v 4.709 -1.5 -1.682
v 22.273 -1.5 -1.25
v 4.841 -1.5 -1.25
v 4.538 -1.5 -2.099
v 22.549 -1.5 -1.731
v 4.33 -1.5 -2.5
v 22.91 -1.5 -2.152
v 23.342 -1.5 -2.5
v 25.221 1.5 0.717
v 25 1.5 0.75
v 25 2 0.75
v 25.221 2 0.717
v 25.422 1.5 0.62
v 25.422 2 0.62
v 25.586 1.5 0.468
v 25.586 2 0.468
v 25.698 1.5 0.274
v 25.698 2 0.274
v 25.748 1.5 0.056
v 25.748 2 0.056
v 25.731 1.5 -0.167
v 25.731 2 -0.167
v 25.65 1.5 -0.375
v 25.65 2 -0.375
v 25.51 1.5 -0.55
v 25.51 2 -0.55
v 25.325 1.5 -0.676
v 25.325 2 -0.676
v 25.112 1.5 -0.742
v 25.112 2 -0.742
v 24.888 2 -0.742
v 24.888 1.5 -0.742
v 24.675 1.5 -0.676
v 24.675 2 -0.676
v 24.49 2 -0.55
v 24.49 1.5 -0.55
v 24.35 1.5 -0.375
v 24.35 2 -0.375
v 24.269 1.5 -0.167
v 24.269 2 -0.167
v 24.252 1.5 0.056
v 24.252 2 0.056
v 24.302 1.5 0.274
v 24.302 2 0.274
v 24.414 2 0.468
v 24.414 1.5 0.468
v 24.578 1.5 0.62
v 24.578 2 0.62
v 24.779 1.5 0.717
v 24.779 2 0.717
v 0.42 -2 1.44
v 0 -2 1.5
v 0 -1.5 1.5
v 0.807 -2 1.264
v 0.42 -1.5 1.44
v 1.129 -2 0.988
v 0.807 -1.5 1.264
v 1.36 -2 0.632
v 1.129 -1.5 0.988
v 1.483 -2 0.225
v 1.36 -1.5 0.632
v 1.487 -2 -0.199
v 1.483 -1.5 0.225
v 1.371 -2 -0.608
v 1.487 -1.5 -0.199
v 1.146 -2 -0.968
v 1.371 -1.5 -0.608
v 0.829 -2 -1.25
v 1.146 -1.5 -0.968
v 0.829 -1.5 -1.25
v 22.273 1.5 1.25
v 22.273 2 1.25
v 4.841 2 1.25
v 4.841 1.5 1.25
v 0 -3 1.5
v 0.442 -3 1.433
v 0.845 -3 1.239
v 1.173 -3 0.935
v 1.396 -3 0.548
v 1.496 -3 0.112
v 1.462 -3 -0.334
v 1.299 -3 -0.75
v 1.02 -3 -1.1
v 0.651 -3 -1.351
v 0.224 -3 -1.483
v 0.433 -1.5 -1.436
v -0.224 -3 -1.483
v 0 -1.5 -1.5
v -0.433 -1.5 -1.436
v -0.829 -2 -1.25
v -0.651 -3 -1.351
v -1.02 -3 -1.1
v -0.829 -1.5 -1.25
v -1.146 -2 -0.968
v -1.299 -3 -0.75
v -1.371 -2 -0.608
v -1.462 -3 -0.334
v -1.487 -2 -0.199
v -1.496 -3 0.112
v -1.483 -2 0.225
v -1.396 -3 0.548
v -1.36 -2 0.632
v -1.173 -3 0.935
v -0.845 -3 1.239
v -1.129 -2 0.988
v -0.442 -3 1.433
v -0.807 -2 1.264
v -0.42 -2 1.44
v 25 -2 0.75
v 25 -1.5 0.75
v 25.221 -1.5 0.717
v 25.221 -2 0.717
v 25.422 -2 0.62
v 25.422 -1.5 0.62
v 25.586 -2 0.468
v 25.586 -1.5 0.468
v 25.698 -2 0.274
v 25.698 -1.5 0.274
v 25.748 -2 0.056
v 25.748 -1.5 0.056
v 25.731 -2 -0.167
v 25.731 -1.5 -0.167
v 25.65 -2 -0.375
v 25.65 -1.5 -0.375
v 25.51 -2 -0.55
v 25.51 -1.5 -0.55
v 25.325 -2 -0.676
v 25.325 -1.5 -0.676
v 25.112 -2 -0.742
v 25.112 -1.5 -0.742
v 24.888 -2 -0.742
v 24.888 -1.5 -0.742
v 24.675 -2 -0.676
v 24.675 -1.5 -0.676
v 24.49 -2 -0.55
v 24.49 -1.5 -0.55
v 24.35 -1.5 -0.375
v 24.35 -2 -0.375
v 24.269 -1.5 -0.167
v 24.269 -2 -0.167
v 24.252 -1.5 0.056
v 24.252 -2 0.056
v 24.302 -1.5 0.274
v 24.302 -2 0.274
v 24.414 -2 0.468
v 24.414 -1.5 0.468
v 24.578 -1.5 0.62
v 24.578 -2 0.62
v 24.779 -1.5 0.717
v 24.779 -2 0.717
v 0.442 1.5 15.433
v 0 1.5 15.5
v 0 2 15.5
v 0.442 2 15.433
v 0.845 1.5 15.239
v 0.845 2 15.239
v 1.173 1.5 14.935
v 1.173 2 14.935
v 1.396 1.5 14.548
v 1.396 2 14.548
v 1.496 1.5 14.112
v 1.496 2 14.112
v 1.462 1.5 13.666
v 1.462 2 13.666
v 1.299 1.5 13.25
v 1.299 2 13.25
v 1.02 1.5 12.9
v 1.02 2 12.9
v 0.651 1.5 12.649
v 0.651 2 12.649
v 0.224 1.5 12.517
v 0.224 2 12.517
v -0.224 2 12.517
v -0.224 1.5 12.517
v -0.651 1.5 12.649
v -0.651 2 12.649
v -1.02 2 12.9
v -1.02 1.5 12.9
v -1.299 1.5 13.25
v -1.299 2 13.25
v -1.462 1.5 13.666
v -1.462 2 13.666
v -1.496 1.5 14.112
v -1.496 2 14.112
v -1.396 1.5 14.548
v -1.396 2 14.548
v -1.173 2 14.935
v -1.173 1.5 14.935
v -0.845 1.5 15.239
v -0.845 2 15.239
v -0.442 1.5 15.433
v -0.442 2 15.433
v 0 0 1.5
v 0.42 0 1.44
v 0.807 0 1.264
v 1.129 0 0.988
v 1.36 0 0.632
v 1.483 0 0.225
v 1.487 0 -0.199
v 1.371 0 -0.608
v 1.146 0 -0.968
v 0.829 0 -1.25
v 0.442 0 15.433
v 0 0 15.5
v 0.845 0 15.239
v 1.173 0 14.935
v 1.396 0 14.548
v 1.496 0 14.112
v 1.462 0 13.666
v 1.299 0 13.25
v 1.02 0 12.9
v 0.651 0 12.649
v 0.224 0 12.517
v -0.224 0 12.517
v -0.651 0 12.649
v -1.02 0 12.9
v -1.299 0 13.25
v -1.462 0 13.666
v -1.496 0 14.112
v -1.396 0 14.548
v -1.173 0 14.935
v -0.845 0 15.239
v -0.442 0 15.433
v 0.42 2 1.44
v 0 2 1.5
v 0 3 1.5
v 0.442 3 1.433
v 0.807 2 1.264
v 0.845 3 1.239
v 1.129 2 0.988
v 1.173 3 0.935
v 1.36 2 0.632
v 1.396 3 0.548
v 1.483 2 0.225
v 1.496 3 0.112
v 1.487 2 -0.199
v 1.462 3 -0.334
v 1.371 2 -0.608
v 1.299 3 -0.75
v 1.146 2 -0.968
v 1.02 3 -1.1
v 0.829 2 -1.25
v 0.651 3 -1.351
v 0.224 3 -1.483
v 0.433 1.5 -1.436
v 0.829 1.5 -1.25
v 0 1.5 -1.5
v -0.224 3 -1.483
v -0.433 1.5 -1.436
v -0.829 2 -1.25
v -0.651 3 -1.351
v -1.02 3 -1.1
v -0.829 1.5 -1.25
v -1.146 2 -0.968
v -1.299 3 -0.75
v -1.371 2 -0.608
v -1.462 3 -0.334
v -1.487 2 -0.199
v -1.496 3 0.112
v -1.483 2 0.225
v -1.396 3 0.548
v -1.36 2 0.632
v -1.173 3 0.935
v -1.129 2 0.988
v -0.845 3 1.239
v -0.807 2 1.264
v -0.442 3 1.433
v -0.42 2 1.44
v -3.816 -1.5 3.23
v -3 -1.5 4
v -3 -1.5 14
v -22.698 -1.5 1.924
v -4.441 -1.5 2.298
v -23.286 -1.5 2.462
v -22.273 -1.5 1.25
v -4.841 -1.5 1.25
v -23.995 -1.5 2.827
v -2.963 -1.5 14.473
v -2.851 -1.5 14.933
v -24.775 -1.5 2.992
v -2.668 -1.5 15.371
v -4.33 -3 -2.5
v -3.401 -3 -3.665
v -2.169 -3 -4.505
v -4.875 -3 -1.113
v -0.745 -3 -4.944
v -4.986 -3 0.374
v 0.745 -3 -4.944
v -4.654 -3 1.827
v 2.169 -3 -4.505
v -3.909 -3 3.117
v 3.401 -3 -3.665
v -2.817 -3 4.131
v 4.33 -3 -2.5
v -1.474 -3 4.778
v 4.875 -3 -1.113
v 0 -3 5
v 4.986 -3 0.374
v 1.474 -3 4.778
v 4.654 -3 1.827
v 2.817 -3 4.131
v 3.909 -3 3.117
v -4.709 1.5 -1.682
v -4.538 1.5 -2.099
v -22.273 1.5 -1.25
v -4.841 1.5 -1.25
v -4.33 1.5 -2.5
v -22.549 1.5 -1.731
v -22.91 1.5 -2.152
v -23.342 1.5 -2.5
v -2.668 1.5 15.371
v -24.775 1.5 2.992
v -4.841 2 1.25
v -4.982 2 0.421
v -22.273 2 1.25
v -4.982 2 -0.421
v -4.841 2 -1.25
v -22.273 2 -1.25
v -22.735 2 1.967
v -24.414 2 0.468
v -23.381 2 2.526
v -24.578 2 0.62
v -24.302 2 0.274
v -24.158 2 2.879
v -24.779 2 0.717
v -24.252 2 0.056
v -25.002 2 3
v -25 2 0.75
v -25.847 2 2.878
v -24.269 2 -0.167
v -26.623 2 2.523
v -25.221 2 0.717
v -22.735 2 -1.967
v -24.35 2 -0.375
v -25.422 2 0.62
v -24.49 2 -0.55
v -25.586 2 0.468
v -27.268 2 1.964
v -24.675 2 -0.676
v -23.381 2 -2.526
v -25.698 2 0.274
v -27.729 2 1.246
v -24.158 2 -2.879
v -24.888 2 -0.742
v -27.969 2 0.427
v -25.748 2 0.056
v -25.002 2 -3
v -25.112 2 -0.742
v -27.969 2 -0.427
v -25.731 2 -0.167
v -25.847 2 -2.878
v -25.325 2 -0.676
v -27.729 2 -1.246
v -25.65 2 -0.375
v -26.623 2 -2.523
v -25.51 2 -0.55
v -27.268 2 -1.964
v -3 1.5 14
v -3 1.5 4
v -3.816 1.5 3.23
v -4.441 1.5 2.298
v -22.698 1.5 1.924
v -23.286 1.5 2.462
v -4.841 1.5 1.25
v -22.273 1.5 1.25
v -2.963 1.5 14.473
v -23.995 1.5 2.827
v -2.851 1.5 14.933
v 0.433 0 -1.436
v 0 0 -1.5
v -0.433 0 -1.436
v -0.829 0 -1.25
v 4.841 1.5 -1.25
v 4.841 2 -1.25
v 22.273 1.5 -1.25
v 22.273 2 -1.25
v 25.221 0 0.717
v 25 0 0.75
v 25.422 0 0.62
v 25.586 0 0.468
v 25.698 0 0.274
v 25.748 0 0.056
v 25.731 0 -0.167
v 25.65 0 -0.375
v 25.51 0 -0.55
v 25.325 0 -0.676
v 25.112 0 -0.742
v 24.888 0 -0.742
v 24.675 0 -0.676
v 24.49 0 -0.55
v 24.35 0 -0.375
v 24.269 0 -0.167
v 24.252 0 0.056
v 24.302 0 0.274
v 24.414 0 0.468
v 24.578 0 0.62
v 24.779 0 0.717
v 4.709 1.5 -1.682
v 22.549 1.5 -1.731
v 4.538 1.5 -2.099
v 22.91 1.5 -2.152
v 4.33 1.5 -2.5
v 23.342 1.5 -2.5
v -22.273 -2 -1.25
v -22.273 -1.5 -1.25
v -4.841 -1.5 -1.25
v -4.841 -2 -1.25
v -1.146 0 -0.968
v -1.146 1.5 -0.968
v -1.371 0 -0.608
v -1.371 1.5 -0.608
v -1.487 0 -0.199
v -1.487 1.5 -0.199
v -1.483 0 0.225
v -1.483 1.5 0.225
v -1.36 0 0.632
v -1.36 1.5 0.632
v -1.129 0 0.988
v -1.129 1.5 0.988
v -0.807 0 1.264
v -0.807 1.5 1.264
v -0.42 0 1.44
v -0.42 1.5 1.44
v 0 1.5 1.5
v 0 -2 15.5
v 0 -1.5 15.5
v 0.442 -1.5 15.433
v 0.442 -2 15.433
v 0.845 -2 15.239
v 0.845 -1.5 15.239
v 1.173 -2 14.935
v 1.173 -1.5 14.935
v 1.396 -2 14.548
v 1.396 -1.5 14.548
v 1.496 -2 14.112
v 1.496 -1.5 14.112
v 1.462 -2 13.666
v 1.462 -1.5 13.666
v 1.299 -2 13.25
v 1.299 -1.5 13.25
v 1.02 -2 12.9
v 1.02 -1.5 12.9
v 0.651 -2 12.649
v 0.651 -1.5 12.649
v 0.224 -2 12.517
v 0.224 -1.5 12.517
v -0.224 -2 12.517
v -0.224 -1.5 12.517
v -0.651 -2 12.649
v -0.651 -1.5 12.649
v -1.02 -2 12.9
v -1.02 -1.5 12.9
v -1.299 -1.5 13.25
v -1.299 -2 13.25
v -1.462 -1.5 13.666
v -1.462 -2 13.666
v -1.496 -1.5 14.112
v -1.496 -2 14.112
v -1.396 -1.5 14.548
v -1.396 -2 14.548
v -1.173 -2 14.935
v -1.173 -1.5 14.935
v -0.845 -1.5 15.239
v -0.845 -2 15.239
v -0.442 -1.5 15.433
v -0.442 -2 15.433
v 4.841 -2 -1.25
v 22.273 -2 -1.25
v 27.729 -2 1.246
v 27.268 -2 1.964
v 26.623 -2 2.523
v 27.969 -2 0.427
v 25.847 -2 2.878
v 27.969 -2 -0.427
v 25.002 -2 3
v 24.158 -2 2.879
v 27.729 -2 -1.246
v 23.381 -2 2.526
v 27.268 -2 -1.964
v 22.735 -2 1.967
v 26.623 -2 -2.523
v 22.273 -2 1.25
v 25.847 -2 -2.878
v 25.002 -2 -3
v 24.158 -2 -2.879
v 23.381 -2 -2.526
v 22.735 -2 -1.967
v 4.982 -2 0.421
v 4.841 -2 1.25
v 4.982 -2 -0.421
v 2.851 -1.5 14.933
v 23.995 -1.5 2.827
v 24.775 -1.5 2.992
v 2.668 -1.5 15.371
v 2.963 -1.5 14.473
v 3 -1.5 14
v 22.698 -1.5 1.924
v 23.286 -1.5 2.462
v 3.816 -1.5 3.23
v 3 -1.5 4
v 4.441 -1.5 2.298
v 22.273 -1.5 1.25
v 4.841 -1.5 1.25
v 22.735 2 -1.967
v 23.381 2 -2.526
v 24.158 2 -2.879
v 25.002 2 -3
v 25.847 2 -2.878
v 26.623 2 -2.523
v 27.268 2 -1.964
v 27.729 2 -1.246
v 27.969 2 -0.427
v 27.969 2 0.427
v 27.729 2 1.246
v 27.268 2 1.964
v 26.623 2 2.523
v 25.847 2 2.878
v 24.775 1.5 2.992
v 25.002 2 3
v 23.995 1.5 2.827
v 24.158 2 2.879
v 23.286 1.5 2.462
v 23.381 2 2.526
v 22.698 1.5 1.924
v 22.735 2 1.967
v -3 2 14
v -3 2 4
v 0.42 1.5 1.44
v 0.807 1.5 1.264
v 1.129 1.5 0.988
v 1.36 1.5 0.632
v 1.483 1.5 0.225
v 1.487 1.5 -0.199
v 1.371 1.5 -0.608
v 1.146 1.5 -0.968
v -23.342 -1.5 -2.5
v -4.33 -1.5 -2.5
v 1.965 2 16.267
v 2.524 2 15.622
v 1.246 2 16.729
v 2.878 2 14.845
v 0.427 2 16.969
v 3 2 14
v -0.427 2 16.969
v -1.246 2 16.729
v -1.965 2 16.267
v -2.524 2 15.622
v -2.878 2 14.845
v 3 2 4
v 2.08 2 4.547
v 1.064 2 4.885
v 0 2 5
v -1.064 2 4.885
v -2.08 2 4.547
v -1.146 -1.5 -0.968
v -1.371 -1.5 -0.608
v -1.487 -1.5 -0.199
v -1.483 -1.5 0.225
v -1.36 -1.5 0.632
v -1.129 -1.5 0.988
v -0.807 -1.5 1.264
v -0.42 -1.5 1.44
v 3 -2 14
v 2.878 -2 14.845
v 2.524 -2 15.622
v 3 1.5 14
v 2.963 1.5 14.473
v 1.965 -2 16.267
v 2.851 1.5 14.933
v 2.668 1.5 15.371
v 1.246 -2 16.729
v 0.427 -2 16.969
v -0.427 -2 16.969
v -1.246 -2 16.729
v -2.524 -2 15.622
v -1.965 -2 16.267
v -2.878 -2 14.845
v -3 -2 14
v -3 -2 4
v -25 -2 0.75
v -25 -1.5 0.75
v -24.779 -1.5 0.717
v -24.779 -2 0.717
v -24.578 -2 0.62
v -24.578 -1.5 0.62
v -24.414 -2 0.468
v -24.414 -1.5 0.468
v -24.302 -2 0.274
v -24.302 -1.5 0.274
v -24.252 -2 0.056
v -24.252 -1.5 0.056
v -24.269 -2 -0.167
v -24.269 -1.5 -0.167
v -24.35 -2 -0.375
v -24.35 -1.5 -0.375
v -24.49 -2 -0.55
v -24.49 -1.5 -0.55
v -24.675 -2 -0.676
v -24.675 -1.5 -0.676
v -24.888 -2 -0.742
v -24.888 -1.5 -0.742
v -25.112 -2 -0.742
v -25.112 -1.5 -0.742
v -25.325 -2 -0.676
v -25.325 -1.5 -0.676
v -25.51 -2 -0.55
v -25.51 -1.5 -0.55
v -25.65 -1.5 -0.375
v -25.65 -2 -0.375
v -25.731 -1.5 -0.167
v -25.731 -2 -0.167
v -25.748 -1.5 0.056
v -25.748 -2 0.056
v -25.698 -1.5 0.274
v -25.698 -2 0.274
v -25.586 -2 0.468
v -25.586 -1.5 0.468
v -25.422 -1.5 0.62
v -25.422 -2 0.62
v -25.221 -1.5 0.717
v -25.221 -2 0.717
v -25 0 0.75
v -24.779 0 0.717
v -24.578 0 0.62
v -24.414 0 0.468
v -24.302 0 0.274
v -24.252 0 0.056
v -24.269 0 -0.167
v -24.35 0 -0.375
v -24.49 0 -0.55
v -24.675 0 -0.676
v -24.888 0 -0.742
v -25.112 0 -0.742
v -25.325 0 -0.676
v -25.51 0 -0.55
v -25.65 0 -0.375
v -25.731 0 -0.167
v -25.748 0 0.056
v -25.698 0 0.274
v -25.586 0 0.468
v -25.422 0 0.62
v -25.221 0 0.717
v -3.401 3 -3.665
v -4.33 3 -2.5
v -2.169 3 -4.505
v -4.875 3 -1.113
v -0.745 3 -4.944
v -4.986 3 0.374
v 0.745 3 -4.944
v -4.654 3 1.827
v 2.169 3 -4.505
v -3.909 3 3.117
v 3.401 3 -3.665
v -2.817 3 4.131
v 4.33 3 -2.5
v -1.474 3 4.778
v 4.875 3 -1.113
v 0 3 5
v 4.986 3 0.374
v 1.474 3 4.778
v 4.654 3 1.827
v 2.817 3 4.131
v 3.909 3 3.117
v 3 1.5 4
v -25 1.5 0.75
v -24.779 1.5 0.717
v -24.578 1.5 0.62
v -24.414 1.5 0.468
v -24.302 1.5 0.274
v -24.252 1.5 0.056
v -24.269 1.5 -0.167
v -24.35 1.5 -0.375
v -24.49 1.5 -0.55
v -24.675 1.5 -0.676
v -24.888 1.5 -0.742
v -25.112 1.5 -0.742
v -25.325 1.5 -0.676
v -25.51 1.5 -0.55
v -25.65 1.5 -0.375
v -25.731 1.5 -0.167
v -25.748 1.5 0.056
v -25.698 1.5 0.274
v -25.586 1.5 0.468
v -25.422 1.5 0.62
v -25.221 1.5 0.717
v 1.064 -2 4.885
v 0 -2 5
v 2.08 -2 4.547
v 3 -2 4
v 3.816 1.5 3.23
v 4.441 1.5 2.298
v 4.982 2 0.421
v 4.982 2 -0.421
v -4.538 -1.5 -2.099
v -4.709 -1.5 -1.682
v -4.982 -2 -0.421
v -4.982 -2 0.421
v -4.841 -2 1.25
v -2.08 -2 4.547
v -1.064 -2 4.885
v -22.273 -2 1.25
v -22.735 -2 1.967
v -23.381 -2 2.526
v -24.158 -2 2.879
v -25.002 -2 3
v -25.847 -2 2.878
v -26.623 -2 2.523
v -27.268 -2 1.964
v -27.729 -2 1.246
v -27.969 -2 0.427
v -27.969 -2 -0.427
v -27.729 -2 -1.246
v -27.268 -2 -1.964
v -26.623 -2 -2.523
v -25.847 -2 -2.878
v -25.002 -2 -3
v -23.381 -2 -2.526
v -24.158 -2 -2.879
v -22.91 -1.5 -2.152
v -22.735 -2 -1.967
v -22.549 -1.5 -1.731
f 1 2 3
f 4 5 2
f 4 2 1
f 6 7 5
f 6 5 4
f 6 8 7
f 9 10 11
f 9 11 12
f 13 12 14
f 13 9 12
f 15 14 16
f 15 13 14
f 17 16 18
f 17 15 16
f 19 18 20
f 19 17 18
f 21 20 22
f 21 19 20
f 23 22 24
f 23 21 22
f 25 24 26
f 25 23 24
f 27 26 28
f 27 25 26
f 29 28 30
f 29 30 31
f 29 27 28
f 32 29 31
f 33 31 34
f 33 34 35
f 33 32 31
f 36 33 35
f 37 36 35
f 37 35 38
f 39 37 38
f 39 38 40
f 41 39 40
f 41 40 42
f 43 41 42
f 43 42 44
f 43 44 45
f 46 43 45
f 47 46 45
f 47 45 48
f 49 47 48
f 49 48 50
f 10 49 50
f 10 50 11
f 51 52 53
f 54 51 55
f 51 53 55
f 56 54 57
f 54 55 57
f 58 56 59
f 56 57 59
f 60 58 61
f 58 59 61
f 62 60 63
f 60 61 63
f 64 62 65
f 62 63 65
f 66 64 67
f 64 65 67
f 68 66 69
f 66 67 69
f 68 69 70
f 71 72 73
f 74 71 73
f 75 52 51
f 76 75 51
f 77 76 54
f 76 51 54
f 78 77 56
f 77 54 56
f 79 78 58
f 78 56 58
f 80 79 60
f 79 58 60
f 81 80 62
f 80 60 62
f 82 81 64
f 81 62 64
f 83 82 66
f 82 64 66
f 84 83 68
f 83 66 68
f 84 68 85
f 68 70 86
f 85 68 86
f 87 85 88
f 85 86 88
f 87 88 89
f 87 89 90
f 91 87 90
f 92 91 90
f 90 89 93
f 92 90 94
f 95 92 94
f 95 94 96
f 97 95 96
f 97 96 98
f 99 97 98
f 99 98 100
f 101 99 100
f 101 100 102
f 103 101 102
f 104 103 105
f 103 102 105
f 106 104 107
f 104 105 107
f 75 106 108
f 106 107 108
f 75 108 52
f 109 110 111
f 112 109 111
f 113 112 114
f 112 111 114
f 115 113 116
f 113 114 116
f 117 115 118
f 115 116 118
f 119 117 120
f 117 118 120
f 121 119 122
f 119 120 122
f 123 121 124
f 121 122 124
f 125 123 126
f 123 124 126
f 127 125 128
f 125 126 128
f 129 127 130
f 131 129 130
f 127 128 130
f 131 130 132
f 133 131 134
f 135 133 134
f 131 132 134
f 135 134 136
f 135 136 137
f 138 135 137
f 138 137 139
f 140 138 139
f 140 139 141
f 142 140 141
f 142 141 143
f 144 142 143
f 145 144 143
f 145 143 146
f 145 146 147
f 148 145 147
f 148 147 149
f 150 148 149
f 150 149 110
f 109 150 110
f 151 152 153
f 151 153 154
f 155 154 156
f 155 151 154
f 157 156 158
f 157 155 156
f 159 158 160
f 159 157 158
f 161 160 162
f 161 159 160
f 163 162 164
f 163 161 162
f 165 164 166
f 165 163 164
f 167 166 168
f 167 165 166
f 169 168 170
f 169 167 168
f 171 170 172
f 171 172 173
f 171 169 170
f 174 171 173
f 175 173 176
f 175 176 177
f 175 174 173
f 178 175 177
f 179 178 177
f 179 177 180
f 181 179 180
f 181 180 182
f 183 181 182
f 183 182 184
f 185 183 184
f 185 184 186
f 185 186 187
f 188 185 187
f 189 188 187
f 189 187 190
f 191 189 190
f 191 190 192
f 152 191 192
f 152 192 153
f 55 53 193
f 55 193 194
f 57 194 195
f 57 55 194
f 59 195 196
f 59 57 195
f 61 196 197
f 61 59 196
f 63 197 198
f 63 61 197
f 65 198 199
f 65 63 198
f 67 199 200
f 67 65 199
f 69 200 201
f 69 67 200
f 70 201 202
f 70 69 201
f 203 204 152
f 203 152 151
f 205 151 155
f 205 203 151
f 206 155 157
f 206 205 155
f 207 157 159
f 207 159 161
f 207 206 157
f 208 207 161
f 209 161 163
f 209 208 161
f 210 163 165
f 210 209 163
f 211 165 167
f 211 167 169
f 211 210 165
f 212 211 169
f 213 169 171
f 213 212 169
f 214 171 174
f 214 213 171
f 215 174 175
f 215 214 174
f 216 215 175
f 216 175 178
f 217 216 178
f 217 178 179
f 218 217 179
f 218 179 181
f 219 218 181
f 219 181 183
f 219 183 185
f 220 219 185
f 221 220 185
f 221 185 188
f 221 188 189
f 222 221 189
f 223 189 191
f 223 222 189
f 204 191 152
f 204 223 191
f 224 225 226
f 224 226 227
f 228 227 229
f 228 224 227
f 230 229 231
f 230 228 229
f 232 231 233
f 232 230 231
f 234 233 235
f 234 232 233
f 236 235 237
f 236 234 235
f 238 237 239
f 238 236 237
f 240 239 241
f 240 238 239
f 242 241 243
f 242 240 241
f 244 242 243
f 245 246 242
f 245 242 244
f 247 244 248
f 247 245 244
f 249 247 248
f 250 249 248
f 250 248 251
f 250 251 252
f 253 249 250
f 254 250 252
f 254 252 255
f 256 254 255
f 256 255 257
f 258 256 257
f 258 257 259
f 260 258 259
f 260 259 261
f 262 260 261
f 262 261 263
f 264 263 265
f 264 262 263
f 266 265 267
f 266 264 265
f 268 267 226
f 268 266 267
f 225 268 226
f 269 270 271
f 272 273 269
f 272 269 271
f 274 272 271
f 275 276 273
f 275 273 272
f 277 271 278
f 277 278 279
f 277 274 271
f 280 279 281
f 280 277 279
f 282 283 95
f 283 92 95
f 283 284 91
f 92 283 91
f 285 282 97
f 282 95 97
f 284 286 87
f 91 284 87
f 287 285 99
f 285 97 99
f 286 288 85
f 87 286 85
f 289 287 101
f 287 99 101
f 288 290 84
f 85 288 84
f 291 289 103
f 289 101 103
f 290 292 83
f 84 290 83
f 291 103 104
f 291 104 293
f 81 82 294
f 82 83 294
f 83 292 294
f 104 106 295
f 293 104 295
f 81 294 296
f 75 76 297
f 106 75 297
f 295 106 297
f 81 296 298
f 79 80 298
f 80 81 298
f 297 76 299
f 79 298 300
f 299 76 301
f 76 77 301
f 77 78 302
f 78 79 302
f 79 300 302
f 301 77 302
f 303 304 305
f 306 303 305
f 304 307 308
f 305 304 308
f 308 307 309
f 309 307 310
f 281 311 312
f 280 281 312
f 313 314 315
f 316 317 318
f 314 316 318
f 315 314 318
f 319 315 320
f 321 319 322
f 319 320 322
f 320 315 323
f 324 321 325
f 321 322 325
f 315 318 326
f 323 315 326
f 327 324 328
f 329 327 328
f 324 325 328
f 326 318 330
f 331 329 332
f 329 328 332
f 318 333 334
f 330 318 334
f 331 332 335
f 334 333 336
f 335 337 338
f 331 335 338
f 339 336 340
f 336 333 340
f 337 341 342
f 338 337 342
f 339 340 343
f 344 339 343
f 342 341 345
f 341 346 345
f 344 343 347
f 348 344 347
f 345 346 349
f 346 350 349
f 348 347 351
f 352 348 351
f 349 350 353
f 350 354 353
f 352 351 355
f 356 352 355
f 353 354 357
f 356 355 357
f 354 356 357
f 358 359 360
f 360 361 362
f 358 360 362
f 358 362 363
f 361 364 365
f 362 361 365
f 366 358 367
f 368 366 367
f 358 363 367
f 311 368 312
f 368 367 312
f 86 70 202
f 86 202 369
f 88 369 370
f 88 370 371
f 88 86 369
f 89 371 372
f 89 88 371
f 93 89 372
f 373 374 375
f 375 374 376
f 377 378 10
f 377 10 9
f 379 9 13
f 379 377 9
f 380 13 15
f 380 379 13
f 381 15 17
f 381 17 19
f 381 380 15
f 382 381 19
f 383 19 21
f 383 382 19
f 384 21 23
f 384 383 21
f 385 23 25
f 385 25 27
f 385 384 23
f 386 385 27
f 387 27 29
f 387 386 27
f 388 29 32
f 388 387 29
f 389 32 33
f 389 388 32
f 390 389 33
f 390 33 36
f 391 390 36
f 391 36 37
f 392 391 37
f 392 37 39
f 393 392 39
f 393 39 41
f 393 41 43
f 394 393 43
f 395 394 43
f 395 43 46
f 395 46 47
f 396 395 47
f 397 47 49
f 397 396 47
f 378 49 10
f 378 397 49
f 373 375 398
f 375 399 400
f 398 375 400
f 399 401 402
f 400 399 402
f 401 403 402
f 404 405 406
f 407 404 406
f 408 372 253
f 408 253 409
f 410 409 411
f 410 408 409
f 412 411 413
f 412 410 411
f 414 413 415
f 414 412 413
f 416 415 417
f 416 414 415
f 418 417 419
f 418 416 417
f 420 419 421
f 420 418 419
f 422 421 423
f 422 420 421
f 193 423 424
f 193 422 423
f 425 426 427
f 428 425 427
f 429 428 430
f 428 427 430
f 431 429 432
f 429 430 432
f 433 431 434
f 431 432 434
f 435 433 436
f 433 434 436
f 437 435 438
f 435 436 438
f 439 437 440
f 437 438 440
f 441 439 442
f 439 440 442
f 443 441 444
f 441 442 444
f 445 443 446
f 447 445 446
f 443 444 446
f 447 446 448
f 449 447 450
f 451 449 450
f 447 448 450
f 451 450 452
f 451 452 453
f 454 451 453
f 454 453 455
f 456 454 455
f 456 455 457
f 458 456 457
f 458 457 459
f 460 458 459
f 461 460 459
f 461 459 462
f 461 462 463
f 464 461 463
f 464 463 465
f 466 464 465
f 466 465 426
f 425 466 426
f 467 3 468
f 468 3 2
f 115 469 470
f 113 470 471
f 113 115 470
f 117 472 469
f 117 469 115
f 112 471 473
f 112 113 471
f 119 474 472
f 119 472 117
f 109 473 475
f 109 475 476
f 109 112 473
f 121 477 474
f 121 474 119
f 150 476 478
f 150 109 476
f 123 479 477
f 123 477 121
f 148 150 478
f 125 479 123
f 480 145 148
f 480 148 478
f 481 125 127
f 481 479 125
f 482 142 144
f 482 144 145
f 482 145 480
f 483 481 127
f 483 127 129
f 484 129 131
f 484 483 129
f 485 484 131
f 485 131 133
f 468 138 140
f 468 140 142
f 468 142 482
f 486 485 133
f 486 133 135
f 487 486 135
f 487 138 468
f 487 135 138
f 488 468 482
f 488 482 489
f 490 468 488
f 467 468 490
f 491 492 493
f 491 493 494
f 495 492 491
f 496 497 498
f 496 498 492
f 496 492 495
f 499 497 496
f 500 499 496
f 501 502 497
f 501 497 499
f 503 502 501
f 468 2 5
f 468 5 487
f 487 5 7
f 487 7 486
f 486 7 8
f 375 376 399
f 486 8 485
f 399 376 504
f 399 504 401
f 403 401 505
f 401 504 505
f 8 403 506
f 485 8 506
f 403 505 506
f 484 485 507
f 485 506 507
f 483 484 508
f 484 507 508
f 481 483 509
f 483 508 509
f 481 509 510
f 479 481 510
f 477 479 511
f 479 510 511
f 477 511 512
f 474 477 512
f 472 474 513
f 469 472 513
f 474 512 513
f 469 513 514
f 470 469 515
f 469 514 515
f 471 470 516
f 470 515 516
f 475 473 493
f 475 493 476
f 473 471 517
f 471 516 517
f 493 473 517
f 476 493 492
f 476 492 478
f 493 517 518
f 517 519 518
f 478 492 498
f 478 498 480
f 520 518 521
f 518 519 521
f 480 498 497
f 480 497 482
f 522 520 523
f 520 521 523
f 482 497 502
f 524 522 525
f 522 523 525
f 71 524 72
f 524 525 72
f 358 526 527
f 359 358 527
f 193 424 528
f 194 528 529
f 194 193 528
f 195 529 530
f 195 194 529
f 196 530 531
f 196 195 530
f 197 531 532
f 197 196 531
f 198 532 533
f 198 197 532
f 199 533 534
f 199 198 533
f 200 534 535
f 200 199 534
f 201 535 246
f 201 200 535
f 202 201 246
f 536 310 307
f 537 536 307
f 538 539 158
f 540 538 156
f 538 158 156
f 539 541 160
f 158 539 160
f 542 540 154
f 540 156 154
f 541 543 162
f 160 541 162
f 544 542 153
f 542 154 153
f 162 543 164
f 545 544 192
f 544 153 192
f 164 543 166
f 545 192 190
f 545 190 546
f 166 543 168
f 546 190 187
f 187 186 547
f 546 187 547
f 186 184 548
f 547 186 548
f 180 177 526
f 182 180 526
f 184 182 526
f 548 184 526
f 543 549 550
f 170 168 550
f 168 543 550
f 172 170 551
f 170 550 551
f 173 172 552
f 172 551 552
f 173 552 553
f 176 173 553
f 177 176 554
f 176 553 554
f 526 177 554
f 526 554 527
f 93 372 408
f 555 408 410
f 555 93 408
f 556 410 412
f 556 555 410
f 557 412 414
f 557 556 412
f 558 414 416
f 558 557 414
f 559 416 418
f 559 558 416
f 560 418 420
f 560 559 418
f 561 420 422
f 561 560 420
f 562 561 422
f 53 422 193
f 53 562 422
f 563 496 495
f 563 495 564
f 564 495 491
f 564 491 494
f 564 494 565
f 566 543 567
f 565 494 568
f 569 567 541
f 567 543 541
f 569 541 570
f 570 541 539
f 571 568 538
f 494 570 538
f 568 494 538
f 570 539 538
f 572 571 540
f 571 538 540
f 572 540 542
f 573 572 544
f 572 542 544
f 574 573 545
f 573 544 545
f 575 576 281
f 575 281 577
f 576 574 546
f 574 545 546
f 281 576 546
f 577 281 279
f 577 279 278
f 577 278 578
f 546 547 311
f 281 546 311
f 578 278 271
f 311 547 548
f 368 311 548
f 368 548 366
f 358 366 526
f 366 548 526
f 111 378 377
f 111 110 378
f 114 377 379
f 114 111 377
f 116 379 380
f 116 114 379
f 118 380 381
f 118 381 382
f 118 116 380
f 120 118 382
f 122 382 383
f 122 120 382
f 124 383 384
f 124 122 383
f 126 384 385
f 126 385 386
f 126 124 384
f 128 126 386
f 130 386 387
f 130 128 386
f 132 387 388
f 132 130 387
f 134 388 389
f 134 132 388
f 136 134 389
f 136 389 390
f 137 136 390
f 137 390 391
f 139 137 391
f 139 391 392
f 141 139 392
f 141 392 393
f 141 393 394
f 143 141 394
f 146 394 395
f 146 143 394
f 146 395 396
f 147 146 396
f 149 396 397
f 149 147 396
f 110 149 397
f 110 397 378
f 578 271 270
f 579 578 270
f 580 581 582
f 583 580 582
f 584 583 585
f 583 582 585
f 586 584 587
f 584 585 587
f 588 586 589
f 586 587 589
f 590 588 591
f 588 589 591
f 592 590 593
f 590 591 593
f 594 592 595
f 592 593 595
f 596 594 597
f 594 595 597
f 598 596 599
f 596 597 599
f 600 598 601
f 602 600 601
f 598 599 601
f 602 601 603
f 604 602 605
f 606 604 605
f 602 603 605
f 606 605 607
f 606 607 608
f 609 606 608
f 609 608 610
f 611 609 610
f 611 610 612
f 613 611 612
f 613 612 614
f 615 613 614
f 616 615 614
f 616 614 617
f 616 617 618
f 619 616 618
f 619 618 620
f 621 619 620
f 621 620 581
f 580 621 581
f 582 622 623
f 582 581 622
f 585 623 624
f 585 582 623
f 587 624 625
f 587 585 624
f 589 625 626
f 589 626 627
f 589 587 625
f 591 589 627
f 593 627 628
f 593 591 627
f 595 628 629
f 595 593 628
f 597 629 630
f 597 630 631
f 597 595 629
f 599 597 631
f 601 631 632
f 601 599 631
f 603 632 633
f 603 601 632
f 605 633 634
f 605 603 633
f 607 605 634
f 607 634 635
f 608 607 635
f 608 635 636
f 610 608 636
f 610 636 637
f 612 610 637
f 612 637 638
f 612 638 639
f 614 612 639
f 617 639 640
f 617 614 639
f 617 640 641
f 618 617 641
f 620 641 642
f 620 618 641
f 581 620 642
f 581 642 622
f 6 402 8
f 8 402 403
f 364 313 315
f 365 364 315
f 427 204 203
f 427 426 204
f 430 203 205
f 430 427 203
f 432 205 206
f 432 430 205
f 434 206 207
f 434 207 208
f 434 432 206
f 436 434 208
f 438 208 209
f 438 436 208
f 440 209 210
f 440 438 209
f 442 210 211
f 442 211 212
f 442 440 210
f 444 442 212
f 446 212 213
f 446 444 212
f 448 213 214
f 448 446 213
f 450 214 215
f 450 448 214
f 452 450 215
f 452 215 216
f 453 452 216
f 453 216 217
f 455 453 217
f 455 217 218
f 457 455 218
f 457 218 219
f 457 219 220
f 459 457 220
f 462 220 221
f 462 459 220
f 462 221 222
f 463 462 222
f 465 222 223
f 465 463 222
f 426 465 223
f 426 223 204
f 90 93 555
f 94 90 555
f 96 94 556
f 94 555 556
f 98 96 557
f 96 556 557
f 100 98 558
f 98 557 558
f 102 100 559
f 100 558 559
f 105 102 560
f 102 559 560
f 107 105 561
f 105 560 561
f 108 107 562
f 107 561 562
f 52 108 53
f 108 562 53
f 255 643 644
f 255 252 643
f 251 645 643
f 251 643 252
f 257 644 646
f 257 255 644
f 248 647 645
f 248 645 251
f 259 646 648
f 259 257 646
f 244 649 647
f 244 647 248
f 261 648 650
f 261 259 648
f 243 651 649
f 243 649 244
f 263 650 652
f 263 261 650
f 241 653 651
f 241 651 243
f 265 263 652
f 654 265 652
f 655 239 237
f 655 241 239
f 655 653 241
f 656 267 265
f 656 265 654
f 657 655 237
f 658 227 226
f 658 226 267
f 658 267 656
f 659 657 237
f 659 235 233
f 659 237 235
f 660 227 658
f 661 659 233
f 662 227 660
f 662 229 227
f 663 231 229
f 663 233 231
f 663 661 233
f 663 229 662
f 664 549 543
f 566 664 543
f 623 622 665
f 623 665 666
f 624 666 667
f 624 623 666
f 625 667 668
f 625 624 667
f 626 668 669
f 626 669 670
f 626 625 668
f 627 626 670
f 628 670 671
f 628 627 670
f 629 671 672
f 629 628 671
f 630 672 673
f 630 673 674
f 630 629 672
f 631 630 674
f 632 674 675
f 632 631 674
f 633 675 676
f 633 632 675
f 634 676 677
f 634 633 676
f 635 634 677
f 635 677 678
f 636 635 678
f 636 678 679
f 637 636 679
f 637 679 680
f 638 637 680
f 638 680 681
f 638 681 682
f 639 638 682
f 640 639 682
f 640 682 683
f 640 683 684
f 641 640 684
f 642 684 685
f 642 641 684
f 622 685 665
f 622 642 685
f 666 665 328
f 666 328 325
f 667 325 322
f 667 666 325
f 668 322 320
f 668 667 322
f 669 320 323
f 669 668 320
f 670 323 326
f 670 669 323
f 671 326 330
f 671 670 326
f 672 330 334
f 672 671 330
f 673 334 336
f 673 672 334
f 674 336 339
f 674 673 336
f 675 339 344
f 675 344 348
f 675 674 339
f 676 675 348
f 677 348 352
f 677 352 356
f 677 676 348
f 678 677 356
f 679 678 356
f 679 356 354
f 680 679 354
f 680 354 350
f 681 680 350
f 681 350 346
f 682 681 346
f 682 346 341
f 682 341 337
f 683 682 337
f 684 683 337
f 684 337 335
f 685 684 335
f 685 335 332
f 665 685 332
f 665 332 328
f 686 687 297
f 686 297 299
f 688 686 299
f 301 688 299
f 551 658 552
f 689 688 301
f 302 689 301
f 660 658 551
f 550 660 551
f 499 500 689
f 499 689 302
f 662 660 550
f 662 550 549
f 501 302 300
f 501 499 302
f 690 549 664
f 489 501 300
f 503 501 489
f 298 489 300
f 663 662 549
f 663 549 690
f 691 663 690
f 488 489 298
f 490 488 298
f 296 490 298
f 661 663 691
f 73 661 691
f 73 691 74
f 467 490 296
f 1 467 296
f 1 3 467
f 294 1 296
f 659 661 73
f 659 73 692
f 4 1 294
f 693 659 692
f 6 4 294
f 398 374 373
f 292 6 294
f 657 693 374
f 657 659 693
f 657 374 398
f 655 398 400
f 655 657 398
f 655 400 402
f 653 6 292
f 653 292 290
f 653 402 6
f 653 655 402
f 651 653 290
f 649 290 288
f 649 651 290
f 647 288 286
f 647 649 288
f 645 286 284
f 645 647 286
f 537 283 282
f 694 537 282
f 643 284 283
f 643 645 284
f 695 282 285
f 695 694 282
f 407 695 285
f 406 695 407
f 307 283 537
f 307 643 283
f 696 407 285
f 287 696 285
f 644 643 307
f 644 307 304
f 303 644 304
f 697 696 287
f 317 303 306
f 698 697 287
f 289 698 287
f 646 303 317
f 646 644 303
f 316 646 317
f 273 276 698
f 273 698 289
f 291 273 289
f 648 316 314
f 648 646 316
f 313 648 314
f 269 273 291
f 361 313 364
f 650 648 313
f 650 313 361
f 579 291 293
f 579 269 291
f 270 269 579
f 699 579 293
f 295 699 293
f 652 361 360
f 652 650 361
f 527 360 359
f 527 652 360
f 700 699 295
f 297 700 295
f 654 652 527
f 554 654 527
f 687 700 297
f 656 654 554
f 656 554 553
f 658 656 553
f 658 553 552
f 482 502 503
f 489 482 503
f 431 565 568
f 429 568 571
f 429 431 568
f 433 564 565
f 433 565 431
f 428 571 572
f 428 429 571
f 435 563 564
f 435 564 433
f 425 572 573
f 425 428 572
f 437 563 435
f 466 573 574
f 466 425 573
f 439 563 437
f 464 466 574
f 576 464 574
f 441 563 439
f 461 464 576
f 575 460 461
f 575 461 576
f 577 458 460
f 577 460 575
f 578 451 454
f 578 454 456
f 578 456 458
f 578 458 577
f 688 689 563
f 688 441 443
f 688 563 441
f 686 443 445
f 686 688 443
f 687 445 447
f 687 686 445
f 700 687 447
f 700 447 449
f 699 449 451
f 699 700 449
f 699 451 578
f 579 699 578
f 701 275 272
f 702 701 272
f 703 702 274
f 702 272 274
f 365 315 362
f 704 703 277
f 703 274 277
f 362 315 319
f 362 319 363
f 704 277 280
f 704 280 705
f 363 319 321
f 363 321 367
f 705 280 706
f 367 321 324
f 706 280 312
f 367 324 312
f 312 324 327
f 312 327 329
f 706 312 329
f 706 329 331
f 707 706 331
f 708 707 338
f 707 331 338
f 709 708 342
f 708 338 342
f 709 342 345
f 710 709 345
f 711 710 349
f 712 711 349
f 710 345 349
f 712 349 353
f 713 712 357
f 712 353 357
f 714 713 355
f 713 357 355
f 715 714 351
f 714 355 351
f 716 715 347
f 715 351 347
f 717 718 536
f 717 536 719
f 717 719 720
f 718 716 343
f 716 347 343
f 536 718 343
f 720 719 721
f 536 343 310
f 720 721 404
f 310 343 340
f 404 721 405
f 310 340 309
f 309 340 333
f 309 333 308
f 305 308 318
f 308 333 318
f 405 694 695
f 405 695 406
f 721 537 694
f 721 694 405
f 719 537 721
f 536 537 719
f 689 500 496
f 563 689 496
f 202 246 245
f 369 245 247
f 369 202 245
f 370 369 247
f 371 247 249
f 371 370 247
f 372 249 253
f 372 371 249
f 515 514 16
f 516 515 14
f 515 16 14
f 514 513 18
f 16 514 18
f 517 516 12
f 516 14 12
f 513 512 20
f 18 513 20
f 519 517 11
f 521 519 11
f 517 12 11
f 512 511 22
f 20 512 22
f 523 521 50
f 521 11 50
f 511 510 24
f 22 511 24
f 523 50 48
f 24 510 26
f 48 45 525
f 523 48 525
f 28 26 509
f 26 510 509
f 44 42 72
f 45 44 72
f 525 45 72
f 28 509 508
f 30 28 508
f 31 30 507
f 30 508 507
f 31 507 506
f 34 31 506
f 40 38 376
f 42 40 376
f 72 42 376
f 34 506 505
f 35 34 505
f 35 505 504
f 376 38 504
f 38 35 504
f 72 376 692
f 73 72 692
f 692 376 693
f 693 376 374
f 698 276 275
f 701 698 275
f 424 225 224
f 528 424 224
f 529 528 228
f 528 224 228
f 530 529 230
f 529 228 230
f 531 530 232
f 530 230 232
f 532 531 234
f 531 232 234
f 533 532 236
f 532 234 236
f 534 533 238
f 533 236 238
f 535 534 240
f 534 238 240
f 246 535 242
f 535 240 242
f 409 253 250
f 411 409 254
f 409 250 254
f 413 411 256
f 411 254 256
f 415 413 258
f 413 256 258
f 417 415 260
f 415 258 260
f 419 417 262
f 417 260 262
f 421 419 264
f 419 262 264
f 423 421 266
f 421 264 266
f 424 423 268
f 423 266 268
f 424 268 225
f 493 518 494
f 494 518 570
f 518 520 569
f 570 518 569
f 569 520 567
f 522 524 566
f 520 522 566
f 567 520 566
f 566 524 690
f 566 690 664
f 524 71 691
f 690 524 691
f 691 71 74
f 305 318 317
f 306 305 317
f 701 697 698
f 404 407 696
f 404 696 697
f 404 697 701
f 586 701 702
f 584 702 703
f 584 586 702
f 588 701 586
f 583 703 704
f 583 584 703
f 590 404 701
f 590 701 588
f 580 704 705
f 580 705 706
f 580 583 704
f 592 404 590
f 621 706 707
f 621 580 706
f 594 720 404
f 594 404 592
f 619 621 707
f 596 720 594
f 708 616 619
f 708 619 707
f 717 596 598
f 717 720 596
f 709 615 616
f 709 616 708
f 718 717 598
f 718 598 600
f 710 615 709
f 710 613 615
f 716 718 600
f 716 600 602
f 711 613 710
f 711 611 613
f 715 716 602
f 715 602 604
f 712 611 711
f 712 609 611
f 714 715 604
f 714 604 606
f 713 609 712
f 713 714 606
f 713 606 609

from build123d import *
from build123d.topology import SkipClean

# Parameters (mm, degrees)
SKETCH1_R      = 0.75
SKETCH1_R_2    = 1.5
EXTRUDE1_DEPTH = 1.5
SKETCH2_R      = 0.75
SKETCH2_R_2    = 1.5
EXTRUDE2_DEPTH = 2
SKETCH3_R      = 5
SKETCH3_R_2    = 1.5
EXTRUDE3_DEPTH = 3


with BuildPart() as part:
    # Sketch1 → Extrude1 (new body, symmetric)
    with BuildSketch(Plane(origin=(0, 0, 0), x_dir=(1, 0, 0), z_dir=(0, 1, 0))):
        with BuildLine():
            Line((-25, 2.5), (25, 2.5))
            ThreePointArc((25, 2.5), (27.419004196, 0.631204167), (26.221508422, -2.18126504))
            Line((26.221508422, -2.18126504), (1.221508422, -16.18126504))
            ThreePointArc((1.221508422, -16.18126504), (0, -16.5), (-1.221508422, -16.18126504))
            Line((-1.221508422, -16.18126504), (-26.221508422, -2.18126504))
            ThreePointArc((-26.221508422, -2.18126504), (-27.419004196, 0.631204167), (-25, 2.5))
        make_face()
        with Locations(Location((25, 0, 0), (0, 0, 270))):  # turned: the seam where the file's is
            Circle(SKETCH1_R, mode=Mode.SUBTRACT)
        with Locations(Location((-25, 0, 0), (0, 0, 270))):  # turned: the seam where the file's is
            Circle(SKETCH1_R, mode=Mode.SUBTRACT)
        with Locations(Location((0, -14, 0), (0, 0, 270))):  # turned: the seam where the file's is
            Circle(SKETCH1_R_2, mode=Mode.SUBTRACT)
        with Locations(Location((0, 0, 0), (0, 0, 270))):  # turned: the seam where the file's is
            Circle(SKETCH1_R_2, mode=Mode.SUBTRACT)
    extrude(amount=EXTRUDE1_DEPTH, both=True)

    # Sketch2 → Extrude2 (add, symmetric)
    with SkipClean():  # keep this step's faces unmerged: merging them makes the solid invalid here
        with BuildSketch(Plane(origin=(0, 0, 0), x_dir=(1, 0, 0), z_dir=(0, 1, 0))):
            with BuildLine():
                Line((-22.272821971, 1.25), (-0.829156198, 1.25))
                ThreePointArc((-0.829156198, 1.25), (0, -1.5), (0.829156198, 1.25))
                Line((0.829156198, 1.25), (22.272821971, 1.25))
                ThreePointArc((22.272821971, 1.25), (28, 0), (22.272821971, -1.25))
                Line((22.272821971, -1.25), (3, -1.25))
                Line((3, -1.25), (3, -14))
                ThreePointArc((3, -14), (0, -17), (-3, -14))
                Line((-3, -14), (-3, -1.25))
                Line((-3, -1.25), (-22.272821971, -1.25))
                ThreePointArc((-22.272821971, -1.25), (-28, 0), (-22.272821971, 1.25))
            make_face()
            with Locations(Location((25, 0, 0), (0, 0, 270))):  # turned: the seam where the file's is
                Circle(SKETCH2_R, mode=Mode.SUBTRACT)
            with Locations(Location((0, -14, 0), (0, 0, 270))):  # turned: the seam where the file's is
                Circle(SKETCH2_R_2, mode=Mode.SUBTRACT)
            with Locations(Location((-25, 0, 0), (0, 0, 270))):  # turned: the seam where the file's is
                Circle(SKETCH2_R, mode=Mode.SUBTRACT)
        extrude(amount=EXTRUDE2_DEPTH, both=True)

    # Sketch3 → Extrude3 (add, symmetric)
    with SkipClean():  # keep this step's faces unmerged: merging them makes the solid invalid here
        with BuildSketch(Plane(origin=(0, 0, 0), x_dir=(1, 0, 0), z_dir=(0, 1, 0))):
            with Locations(Location((0, 0, 0), (0, 0, 270))):  # turned: the seam where the file's is
                Circle(SKETCH3_R)
            with Locations(Location((0, 0, 0), (0, 0, 270))):  # turned: the seam where the file's is
                Circle(SKETCH3_R_2, mode=Mode.SUBTRACT)
        extrude(amount=EXTRUDE3_DEPTH, both=True)


solid = part.part
